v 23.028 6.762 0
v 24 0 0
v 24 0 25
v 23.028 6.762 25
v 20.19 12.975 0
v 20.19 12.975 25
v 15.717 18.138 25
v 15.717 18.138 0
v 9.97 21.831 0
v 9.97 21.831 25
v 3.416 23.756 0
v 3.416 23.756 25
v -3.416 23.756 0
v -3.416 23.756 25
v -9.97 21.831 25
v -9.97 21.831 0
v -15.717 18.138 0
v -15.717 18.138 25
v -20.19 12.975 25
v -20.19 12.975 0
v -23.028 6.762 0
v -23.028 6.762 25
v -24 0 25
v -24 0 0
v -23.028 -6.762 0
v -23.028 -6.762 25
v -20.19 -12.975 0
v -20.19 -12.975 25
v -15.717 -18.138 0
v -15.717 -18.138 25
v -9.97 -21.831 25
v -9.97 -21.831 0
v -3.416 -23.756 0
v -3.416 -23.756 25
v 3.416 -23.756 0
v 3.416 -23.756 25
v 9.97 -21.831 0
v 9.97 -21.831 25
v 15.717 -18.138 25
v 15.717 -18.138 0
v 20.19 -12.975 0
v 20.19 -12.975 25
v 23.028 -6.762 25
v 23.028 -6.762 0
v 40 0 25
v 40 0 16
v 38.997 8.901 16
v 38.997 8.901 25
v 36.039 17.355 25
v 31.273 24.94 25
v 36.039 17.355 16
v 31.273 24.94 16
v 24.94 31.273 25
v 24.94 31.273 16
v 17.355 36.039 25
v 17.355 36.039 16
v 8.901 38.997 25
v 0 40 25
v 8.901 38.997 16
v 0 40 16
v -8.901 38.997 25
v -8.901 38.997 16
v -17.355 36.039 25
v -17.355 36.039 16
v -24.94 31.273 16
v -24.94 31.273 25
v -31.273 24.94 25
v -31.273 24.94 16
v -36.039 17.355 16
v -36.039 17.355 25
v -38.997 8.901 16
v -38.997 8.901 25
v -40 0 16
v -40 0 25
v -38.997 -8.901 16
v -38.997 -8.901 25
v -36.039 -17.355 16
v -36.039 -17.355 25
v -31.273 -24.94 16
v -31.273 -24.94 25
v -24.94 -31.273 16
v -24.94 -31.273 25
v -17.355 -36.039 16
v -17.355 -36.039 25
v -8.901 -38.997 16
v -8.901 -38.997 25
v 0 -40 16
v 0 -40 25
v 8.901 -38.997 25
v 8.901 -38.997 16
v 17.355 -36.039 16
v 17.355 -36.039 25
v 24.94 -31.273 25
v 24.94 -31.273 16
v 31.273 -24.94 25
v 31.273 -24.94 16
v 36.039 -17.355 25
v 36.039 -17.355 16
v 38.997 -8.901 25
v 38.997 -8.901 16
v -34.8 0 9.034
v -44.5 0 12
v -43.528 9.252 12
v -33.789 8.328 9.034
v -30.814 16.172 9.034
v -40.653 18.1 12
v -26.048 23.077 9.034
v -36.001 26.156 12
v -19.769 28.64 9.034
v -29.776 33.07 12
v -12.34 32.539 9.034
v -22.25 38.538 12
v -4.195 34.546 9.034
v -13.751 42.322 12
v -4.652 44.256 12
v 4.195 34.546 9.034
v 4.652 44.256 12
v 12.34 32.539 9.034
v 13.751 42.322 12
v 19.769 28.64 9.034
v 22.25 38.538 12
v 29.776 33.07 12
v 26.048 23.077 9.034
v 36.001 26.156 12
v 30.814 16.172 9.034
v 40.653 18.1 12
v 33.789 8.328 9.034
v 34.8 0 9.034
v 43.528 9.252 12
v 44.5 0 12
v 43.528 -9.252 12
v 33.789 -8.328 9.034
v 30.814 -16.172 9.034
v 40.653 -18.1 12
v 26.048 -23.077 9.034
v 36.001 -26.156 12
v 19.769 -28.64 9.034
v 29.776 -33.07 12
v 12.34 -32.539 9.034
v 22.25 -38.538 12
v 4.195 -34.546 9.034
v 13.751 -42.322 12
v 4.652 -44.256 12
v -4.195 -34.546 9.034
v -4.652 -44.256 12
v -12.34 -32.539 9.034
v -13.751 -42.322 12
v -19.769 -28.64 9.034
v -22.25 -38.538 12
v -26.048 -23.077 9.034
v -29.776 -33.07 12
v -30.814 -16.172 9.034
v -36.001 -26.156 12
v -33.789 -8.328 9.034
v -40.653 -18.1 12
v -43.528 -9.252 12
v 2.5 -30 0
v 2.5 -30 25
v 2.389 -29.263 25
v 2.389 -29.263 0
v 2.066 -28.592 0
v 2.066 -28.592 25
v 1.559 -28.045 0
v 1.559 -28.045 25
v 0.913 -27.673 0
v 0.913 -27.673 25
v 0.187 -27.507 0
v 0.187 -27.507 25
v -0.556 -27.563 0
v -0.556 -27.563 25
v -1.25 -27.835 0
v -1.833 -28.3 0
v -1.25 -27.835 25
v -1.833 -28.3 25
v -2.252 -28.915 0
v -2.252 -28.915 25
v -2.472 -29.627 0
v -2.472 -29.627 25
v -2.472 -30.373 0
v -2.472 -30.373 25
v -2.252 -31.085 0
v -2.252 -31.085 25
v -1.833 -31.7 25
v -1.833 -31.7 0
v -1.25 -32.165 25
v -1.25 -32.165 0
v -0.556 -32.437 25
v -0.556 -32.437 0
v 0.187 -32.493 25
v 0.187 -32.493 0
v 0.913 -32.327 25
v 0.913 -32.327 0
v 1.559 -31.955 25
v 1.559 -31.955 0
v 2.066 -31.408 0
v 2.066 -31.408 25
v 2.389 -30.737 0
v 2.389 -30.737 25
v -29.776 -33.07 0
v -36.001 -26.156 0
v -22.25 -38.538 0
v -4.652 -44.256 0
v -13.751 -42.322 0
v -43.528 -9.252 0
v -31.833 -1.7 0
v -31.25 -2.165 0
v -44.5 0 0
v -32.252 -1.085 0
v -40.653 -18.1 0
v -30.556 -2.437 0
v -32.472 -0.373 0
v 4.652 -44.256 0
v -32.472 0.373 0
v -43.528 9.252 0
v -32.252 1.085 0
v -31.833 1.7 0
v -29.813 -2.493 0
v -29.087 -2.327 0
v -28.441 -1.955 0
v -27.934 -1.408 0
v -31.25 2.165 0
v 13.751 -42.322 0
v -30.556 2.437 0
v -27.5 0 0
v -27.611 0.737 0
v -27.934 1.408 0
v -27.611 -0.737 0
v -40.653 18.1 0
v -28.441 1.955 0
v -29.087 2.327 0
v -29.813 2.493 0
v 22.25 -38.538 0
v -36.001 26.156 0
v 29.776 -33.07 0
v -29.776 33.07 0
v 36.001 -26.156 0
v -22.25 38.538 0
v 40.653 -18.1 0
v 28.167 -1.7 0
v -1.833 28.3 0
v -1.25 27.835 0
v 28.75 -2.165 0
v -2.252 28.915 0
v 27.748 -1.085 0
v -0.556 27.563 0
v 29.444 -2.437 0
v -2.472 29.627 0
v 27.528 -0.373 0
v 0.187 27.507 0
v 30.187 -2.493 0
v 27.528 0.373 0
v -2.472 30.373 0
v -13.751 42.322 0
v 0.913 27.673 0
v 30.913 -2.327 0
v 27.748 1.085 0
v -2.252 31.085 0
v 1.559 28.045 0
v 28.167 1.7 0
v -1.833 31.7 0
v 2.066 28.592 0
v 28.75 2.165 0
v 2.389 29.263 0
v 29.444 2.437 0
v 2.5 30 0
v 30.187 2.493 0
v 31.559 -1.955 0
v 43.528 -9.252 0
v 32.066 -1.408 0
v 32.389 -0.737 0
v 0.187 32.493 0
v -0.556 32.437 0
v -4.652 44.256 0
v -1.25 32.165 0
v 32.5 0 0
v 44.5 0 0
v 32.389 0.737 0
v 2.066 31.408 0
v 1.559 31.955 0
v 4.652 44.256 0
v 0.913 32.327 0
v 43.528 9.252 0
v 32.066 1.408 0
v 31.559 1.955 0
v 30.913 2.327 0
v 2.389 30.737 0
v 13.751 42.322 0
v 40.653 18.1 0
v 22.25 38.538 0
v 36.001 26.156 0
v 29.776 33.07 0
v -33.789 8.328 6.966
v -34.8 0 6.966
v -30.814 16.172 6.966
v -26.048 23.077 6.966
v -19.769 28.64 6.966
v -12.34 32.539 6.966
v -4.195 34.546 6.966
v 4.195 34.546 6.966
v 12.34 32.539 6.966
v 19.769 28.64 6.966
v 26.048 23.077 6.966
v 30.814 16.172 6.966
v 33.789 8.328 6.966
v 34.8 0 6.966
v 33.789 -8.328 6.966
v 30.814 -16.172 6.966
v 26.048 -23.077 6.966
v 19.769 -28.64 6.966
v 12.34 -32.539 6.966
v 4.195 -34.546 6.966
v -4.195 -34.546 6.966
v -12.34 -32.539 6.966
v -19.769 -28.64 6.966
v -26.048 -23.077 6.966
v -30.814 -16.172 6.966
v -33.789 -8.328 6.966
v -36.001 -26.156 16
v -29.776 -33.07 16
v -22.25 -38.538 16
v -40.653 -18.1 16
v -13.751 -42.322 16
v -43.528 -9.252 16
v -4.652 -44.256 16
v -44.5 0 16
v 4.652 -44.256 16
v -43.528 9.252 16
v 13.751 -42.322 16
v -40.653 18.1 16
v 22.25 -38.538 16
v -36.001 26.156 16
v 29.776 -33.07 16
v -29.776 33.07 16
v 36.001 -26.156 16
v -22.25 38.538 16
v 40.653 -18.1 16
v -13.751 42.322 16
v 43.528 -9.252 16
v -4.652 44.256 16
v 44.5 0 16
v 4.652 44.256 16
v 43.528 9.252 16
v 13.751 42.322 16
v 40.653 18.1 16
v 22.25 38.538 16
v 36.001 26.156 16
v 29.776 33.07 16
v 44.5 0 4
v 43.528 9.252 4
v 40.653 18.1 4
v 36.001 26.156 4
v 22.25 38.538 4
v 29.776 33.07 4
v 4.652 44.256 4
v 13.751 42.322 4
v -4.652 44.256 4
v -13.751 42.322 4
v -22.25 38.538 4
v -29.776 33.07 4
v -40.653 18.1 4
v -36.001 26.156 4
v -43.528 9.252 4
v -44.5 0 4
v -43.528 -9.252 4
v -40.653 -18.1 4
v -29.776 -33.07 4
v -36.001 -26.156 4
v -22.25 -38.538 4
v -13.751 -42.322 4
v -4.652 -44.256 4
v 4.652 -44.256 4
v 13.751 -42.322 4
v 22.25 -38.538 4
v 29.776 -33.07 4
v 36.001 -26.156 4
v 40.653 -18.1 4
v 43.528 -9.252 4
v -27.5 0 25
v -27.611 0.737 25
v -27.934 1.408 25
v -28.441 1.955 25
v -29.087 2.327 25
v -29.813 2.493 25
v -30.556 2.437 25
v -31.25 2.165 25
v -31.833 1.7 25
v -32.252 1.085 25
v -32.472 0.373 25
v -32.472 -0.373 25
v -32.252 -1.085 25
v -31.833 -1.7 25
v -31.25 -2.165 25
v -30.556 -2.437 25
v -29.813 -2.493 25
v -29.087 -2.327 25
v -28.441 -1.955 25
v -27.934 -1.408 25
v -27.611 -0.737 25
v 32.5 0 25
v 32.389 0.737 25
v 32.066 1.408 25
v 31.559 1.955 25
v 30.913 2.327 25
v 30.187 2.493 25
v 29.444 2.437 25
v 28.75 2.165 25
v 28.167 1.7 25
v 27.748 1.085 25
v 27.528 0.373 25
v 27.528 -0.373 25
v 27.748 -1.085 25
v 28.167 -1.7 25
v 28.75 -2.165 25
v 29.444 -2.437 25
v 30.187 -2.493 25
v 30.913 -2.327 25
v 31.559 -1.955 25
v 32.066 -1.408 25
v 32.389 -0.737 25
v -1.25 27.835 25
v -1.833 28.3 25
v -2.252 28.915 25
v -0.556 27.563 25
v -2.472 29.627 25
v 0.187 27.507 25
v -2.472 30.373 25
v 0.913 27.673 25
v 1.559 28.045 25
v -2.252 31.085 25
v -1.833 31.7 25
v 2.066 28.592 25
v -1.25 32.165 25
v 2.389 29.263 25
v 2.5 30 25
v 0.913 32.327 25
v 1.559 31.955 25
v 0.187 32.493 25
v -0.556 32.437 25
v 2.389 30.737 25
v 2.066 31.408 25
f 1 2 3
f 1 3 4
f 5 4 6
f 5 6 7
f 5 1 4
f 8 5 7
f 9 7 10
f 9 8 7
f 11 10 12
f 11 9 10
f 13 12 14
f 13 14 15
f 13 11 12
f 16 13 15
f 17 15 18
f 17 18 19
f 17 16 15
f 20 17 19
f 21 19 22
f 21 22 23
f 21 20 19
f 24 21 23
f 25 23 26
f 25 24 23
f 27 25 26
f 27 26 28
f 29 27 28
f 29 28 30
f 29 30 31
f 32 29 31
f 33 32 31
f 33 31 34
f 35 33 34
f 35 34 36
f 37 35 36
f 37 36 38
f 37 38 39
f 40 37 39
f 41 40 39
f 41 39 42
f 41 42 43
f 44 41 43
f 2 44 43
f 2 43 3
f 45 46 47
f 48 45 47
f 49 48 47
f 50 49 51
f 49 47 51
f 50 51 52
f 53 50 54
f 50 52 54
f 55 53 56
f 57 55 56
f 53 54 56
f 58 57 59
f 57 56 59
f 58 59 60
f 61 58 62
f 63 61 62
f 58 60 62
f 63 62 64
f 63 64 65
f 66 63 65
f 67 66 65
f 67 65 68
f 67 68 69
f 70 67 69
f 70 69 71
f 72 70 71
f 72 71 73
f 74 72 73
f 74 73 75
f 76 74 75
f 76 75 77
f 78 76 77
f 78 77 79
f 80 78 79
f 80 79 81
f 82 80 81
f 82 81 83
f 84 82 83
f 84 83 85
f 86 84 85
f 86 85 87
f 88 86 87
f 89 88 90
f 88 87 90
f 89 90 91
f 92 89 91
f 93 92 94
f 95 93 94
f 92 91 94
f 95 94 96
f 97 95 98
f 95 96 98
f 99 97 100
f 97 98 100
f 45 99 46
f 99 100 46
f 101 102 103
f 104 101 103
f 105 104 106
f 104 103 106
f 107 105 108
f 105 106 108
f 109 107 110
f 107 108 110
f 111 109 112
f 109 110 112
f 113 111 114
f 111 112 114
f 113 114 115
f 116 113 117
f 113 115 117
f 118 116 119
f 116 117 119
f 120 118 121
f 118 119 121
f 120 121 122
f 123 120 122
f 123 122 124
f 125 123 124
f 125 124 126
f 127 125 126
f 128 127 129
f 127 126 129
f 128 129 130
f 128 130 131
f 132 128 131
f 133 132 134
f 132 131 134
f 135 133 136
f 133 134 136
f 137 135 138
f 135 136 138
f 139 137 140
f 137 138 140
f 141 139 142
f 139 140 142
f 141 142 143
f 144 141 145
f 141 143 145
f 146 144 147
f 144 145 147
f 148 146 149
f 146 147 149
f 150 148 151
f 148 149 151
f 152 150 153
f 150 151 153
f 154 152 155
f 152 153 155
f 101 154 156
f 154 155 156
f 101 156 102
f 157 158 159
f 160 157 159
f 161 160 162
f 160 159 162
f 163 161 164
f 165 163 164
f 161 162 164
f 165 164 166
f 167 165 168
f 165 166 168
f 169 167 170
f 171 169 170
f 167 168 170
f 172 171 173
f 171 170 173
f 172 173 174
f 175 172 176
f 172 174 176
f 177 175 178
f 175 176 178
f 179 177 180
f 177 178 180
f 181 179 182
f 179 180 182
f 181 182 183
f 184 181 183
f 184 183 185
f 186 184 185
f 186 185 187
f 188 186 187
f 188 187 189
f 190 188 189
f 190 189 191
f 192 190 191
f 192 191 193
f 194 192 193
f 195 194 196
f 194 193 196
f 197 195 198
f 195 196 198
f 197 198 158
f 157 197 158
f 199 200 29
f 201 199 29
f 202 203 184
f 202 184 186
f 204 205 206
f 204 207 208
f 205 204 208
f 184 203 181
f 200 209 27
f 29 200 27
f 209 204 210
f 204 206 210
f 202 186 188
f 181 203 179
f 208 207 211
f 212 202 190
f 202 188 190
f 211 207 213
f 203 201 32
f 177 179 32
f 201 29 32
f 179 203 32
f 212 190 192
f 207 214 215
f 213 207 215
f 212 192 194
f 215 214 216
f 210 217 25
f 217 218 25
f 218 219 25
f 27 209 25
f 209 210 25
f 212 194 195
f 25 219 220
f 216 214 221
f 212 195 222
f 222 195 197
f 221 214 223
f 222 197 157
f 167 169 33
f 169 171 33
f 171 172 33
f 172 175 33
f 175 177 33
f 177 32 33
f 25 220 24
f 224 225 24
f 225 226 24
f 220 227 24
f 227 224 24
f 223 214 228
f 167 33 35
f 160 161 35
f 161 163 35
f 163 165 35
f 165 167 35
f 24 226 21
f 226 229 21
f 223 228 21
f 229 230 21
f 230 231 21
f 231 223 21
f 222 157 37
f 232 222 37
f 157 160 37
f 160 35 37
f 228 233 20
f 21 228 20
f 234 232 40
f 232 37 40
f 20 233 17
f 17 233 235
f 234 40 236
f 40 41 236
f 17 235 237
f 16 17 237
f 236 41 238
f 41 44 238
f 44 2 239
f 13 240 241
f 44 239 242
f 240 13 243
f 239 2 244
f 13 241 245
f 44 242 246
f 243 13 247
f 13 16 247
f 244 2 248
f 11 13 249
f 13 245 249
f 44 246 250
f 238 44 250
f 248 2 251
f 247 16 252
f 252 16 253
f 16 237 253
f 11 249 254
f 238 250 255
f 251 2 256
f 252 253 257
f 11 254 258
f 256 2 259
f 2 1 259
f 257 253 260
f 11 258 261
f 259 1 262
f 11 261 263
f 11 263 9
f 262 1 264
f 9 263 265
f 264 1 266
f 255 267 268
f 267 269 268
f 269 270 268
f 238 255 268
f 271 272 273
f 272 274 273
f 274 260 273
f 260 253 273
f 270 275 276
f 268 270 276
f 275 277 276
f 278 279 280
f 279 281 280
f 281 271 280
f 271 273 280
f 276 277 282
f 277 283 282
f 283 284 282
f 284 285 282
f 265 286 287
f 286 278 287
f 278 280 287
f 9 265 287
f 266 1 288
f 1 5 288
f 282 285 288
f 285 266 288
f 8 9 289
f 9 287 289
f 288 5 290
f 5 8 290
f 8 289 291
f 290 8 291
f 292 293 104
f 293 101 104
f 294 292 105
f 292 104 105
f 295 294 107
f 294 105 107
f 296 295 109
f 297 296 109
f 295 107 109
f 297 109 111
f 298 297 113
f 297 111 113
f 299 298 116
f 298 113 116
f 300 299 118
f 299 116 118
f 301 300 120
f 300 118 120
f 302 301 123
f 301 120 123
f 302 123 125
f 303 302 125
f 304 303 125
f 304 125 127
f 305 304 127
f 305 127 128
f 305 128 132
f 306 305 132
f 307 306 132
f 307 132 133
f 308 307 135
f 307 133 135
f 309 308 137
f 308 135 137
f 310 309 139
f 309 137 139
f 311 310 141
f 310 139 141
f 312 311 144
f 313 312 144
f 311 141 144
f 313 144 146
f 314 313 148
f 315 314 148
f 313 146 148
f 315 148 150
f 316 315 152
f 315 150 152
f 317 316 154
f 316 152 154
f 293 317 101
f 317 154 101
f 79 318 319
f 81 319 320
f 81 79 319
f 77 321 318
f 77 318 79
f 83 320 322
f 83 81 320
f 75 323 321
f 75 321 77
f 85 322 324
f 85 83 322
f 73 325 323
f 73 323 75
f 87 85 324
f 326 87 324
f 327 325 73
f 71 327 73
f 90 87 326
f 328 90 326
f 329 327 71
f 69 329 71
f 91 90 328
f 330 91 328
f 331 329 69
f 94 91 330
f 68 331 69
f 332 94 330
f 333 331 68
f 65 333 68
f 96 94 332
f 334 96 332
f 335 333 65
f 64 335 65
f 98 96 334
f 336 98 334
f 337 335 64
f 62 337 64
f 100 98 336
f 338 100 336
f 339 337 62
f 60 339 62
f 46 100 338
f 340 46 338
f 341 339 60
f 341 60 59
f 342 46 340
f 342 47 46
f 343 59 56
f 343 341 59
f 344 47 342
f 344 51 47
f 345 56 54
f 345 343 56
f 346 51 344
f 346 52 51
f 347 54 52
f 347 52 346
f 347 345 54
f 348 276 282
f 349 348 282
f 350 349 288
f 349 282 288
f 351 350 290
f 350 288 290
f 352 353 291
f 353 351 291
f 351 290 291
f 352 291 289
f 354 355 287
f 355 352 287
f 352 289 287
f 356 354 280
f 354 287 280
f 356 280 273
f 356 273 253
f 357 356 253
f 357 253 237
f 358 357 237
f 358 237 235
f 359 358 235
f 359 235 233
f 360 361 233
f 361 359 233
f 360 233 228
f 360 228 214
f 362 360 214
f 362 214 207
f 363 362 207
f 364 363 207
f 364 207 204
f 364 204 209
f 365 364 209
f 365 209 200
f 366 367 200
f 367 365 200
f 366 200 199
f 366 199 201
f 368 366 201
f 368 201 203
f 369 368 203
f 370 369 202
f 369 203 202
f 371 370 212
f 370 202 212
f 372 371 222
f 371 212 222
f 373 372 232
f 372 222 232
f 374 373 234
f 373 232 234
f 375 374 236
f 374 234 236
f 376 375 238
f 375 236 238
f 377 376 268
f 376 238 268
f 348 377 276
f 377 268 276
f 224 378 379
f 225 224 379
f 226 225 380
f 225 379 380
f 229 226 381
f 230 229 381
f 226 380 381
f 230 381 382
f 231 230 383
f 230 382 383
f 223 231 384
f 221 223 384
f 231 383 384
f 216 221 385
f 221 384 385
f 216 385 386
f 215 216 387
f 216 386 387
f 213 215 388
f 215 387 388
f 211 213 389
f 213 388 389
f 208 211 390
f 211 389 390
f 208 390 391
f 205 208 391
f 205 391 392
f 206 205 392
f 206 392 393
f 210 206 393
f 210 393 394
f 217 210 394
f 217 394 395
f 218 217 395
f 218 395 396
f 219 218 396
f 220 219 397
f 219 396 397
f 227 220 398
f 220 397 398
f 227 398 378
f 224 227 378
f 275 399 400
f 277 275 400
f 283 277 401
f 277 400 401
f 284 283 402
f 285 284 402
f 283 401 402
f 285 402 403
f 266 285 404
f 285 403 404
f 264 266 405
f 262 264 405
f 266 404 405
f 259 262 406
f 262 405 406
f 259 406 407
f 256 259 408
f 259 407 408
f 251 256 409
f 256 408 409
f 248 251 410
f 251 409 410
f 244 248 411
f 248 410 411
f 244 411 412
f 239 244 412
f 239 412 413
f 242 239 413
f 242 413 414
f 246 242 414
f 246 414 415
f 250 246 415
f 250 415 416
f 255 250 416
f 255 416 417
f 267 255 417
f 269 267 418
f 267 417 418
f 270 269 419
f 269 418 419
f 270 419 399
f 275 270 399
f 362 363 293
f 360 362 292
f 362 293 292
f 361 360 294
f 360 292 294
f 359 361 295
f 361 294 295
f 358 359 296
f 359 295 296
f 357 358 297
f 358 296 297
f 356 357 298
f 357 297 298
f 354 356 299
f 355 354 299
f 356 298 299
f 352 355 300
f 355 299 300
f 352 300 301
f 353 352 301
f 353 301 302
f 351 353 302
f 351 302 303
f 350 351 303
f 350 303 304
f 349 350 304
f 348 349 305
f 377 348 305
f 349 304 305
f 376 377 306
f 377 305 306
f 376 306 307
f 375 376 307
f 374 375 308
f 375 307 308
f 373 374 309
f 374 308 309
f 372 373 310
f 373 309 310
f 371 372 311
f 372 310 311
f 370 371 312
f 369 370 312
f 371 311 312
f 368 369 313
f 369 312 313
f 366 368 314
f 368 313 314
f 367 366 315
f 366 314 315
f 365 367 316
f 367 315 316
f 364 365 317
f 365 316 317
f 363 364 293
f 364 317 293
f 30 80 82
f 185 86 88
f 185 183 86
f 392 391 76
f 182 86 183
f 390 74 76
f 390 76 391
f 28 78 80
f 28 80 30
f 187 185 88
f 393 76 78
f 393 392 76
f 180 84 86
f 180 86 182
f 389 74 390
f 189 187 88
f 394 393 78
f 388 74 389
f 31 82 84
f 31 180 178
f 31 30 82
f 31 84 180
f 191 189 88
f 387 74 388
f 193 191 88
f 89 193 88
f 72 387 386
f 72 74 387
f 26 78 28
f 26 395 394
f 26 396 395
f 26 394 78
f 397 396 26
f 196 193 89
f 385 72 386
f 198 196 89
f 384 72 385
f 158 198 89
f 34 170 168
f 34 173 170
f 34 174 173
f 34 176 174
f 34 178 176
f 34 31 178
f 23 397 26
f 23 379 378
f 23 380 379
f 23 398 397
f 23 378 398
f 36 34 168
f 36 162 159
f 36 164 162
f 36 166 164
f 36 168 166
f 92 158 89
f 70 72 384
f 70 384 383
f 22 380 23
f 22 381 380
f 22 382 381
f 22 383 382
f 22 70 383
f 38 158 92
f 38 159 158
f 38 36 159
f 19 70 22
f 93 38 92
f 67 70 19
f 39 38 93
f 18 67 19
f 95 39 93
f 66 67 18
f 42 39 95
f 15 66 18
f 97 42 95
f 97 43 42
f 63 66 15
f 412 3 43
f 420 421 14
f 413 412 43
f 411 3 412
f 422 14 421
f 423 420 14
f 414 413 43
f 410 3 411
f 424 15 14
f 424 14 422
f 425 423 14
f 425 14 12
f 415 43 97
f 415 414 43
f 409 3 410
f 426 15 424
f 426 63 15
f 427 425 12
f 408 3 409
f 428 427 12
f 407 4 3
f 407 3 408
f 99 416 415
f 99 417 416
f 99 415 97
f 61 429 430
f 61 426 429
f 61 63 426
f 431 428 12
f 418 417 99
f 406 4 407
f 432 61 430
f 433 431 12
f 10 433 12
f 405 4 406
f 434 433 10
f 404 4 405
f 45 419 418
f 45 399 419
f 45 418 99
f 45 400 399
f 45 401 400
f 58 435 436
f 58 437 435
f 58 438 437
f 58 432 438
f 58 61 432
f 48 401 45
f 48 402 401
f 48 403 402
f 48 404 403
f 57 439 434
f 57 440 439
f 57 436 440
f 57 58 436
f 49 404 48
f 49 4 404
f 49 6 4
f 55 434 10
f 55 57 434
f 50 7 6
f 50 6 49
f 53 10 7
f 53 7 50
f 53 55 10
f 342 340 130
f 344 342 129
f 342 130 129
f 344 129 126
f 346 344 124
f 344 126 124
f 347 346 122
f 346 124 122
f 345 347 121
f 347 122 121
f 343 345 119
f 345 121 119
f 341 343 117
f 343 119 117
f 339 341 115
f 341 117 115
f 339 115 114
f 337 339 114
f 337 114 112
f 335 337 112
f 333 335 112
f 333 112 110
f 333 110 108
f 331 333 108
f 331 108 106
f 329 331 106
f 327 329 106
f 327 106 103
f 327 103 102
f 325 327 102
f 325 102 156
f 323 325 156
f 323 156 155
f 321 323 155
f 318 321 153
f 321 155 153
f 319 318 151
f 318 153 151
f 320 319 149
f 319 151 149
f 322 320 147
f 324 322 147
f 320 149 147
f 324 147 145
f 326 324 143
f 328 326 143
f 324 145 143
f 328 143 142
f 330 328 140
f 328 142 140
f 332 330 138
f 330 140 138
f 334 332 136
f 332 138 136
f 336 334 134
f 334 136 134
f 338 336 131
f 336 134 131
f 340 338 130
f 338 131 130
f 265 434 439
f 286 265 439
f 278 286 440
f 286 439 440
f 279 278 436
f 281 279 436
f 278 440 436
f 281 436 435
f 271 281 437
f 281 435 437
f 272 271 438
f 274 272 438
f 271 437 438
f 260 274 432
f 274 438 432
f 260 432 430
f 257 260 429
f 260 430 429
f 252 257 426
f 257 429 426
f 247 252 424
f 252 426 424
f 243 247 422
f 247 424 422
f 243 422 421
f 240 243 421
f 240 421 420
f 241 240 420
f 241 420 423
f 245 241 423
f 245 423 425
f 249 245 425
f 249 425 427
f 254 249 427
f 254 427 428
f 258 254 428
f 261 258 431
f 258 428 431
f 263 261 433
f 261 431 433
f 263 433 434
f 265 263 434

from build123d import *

# Parameters (mm, degrees)
F0_R     = 44.5
F0_R_2   = 40
F0_R_3   = 24
F1_DEPTH = 16
F2_DEPTH = 25
F5_R     = 2.5
F6_DEPTH = 25


with BuildPart() as f1:
    # F0 (on Top) → F1 (new body)
    with BuildSketch(Plane.XY):
        Circle(F0_R)
        Circle(F0_R_2, mode=Mode.SUBTRACT)
        Circle(F0_R_2)
        Circle(F0_R_3, mode=Mode.SUBTRACT)
    extrude(amount=F1_DEPTH)

    # F0 (on Top) → F2 (join)
    with BuildSketch(Plane.XY):
        Circle(F0_R_2)
        Circle(F0_R_3, mode=Mode.SUBTRACT)
    extrude(amount=F2_DEPTH)

    # F3 (on Front) → F4 (revolve, cut)
    with BuildSketch(Plane.XZ):
        Polygon((-34.8, 9.0344123899), (-44.5, 12), (-44.5, 4), (-34.8, 6.9655876101), align=None)
    revolve(axis=Axis((0, 0, -5.6256647222), (0, 0, -1)), mode=Mode.SUBTRACT)

    # F5 (on face) → F6 (cut)
    with BuildSketch(Plane.XY.offset(25)):
        with Locations((0, 30)):
            Circle(F5_R)
        with Locations((30, 0)):
            Circle(F5_R)
        with Locations((0, -30)):
            Circle(F5_R)
        with Locations((-30, 0)):
            Circle(F5_R)
    extrude(amount=-F6_DEPTH, mode=Mode.SUBTRACT)


solid = f1.part
